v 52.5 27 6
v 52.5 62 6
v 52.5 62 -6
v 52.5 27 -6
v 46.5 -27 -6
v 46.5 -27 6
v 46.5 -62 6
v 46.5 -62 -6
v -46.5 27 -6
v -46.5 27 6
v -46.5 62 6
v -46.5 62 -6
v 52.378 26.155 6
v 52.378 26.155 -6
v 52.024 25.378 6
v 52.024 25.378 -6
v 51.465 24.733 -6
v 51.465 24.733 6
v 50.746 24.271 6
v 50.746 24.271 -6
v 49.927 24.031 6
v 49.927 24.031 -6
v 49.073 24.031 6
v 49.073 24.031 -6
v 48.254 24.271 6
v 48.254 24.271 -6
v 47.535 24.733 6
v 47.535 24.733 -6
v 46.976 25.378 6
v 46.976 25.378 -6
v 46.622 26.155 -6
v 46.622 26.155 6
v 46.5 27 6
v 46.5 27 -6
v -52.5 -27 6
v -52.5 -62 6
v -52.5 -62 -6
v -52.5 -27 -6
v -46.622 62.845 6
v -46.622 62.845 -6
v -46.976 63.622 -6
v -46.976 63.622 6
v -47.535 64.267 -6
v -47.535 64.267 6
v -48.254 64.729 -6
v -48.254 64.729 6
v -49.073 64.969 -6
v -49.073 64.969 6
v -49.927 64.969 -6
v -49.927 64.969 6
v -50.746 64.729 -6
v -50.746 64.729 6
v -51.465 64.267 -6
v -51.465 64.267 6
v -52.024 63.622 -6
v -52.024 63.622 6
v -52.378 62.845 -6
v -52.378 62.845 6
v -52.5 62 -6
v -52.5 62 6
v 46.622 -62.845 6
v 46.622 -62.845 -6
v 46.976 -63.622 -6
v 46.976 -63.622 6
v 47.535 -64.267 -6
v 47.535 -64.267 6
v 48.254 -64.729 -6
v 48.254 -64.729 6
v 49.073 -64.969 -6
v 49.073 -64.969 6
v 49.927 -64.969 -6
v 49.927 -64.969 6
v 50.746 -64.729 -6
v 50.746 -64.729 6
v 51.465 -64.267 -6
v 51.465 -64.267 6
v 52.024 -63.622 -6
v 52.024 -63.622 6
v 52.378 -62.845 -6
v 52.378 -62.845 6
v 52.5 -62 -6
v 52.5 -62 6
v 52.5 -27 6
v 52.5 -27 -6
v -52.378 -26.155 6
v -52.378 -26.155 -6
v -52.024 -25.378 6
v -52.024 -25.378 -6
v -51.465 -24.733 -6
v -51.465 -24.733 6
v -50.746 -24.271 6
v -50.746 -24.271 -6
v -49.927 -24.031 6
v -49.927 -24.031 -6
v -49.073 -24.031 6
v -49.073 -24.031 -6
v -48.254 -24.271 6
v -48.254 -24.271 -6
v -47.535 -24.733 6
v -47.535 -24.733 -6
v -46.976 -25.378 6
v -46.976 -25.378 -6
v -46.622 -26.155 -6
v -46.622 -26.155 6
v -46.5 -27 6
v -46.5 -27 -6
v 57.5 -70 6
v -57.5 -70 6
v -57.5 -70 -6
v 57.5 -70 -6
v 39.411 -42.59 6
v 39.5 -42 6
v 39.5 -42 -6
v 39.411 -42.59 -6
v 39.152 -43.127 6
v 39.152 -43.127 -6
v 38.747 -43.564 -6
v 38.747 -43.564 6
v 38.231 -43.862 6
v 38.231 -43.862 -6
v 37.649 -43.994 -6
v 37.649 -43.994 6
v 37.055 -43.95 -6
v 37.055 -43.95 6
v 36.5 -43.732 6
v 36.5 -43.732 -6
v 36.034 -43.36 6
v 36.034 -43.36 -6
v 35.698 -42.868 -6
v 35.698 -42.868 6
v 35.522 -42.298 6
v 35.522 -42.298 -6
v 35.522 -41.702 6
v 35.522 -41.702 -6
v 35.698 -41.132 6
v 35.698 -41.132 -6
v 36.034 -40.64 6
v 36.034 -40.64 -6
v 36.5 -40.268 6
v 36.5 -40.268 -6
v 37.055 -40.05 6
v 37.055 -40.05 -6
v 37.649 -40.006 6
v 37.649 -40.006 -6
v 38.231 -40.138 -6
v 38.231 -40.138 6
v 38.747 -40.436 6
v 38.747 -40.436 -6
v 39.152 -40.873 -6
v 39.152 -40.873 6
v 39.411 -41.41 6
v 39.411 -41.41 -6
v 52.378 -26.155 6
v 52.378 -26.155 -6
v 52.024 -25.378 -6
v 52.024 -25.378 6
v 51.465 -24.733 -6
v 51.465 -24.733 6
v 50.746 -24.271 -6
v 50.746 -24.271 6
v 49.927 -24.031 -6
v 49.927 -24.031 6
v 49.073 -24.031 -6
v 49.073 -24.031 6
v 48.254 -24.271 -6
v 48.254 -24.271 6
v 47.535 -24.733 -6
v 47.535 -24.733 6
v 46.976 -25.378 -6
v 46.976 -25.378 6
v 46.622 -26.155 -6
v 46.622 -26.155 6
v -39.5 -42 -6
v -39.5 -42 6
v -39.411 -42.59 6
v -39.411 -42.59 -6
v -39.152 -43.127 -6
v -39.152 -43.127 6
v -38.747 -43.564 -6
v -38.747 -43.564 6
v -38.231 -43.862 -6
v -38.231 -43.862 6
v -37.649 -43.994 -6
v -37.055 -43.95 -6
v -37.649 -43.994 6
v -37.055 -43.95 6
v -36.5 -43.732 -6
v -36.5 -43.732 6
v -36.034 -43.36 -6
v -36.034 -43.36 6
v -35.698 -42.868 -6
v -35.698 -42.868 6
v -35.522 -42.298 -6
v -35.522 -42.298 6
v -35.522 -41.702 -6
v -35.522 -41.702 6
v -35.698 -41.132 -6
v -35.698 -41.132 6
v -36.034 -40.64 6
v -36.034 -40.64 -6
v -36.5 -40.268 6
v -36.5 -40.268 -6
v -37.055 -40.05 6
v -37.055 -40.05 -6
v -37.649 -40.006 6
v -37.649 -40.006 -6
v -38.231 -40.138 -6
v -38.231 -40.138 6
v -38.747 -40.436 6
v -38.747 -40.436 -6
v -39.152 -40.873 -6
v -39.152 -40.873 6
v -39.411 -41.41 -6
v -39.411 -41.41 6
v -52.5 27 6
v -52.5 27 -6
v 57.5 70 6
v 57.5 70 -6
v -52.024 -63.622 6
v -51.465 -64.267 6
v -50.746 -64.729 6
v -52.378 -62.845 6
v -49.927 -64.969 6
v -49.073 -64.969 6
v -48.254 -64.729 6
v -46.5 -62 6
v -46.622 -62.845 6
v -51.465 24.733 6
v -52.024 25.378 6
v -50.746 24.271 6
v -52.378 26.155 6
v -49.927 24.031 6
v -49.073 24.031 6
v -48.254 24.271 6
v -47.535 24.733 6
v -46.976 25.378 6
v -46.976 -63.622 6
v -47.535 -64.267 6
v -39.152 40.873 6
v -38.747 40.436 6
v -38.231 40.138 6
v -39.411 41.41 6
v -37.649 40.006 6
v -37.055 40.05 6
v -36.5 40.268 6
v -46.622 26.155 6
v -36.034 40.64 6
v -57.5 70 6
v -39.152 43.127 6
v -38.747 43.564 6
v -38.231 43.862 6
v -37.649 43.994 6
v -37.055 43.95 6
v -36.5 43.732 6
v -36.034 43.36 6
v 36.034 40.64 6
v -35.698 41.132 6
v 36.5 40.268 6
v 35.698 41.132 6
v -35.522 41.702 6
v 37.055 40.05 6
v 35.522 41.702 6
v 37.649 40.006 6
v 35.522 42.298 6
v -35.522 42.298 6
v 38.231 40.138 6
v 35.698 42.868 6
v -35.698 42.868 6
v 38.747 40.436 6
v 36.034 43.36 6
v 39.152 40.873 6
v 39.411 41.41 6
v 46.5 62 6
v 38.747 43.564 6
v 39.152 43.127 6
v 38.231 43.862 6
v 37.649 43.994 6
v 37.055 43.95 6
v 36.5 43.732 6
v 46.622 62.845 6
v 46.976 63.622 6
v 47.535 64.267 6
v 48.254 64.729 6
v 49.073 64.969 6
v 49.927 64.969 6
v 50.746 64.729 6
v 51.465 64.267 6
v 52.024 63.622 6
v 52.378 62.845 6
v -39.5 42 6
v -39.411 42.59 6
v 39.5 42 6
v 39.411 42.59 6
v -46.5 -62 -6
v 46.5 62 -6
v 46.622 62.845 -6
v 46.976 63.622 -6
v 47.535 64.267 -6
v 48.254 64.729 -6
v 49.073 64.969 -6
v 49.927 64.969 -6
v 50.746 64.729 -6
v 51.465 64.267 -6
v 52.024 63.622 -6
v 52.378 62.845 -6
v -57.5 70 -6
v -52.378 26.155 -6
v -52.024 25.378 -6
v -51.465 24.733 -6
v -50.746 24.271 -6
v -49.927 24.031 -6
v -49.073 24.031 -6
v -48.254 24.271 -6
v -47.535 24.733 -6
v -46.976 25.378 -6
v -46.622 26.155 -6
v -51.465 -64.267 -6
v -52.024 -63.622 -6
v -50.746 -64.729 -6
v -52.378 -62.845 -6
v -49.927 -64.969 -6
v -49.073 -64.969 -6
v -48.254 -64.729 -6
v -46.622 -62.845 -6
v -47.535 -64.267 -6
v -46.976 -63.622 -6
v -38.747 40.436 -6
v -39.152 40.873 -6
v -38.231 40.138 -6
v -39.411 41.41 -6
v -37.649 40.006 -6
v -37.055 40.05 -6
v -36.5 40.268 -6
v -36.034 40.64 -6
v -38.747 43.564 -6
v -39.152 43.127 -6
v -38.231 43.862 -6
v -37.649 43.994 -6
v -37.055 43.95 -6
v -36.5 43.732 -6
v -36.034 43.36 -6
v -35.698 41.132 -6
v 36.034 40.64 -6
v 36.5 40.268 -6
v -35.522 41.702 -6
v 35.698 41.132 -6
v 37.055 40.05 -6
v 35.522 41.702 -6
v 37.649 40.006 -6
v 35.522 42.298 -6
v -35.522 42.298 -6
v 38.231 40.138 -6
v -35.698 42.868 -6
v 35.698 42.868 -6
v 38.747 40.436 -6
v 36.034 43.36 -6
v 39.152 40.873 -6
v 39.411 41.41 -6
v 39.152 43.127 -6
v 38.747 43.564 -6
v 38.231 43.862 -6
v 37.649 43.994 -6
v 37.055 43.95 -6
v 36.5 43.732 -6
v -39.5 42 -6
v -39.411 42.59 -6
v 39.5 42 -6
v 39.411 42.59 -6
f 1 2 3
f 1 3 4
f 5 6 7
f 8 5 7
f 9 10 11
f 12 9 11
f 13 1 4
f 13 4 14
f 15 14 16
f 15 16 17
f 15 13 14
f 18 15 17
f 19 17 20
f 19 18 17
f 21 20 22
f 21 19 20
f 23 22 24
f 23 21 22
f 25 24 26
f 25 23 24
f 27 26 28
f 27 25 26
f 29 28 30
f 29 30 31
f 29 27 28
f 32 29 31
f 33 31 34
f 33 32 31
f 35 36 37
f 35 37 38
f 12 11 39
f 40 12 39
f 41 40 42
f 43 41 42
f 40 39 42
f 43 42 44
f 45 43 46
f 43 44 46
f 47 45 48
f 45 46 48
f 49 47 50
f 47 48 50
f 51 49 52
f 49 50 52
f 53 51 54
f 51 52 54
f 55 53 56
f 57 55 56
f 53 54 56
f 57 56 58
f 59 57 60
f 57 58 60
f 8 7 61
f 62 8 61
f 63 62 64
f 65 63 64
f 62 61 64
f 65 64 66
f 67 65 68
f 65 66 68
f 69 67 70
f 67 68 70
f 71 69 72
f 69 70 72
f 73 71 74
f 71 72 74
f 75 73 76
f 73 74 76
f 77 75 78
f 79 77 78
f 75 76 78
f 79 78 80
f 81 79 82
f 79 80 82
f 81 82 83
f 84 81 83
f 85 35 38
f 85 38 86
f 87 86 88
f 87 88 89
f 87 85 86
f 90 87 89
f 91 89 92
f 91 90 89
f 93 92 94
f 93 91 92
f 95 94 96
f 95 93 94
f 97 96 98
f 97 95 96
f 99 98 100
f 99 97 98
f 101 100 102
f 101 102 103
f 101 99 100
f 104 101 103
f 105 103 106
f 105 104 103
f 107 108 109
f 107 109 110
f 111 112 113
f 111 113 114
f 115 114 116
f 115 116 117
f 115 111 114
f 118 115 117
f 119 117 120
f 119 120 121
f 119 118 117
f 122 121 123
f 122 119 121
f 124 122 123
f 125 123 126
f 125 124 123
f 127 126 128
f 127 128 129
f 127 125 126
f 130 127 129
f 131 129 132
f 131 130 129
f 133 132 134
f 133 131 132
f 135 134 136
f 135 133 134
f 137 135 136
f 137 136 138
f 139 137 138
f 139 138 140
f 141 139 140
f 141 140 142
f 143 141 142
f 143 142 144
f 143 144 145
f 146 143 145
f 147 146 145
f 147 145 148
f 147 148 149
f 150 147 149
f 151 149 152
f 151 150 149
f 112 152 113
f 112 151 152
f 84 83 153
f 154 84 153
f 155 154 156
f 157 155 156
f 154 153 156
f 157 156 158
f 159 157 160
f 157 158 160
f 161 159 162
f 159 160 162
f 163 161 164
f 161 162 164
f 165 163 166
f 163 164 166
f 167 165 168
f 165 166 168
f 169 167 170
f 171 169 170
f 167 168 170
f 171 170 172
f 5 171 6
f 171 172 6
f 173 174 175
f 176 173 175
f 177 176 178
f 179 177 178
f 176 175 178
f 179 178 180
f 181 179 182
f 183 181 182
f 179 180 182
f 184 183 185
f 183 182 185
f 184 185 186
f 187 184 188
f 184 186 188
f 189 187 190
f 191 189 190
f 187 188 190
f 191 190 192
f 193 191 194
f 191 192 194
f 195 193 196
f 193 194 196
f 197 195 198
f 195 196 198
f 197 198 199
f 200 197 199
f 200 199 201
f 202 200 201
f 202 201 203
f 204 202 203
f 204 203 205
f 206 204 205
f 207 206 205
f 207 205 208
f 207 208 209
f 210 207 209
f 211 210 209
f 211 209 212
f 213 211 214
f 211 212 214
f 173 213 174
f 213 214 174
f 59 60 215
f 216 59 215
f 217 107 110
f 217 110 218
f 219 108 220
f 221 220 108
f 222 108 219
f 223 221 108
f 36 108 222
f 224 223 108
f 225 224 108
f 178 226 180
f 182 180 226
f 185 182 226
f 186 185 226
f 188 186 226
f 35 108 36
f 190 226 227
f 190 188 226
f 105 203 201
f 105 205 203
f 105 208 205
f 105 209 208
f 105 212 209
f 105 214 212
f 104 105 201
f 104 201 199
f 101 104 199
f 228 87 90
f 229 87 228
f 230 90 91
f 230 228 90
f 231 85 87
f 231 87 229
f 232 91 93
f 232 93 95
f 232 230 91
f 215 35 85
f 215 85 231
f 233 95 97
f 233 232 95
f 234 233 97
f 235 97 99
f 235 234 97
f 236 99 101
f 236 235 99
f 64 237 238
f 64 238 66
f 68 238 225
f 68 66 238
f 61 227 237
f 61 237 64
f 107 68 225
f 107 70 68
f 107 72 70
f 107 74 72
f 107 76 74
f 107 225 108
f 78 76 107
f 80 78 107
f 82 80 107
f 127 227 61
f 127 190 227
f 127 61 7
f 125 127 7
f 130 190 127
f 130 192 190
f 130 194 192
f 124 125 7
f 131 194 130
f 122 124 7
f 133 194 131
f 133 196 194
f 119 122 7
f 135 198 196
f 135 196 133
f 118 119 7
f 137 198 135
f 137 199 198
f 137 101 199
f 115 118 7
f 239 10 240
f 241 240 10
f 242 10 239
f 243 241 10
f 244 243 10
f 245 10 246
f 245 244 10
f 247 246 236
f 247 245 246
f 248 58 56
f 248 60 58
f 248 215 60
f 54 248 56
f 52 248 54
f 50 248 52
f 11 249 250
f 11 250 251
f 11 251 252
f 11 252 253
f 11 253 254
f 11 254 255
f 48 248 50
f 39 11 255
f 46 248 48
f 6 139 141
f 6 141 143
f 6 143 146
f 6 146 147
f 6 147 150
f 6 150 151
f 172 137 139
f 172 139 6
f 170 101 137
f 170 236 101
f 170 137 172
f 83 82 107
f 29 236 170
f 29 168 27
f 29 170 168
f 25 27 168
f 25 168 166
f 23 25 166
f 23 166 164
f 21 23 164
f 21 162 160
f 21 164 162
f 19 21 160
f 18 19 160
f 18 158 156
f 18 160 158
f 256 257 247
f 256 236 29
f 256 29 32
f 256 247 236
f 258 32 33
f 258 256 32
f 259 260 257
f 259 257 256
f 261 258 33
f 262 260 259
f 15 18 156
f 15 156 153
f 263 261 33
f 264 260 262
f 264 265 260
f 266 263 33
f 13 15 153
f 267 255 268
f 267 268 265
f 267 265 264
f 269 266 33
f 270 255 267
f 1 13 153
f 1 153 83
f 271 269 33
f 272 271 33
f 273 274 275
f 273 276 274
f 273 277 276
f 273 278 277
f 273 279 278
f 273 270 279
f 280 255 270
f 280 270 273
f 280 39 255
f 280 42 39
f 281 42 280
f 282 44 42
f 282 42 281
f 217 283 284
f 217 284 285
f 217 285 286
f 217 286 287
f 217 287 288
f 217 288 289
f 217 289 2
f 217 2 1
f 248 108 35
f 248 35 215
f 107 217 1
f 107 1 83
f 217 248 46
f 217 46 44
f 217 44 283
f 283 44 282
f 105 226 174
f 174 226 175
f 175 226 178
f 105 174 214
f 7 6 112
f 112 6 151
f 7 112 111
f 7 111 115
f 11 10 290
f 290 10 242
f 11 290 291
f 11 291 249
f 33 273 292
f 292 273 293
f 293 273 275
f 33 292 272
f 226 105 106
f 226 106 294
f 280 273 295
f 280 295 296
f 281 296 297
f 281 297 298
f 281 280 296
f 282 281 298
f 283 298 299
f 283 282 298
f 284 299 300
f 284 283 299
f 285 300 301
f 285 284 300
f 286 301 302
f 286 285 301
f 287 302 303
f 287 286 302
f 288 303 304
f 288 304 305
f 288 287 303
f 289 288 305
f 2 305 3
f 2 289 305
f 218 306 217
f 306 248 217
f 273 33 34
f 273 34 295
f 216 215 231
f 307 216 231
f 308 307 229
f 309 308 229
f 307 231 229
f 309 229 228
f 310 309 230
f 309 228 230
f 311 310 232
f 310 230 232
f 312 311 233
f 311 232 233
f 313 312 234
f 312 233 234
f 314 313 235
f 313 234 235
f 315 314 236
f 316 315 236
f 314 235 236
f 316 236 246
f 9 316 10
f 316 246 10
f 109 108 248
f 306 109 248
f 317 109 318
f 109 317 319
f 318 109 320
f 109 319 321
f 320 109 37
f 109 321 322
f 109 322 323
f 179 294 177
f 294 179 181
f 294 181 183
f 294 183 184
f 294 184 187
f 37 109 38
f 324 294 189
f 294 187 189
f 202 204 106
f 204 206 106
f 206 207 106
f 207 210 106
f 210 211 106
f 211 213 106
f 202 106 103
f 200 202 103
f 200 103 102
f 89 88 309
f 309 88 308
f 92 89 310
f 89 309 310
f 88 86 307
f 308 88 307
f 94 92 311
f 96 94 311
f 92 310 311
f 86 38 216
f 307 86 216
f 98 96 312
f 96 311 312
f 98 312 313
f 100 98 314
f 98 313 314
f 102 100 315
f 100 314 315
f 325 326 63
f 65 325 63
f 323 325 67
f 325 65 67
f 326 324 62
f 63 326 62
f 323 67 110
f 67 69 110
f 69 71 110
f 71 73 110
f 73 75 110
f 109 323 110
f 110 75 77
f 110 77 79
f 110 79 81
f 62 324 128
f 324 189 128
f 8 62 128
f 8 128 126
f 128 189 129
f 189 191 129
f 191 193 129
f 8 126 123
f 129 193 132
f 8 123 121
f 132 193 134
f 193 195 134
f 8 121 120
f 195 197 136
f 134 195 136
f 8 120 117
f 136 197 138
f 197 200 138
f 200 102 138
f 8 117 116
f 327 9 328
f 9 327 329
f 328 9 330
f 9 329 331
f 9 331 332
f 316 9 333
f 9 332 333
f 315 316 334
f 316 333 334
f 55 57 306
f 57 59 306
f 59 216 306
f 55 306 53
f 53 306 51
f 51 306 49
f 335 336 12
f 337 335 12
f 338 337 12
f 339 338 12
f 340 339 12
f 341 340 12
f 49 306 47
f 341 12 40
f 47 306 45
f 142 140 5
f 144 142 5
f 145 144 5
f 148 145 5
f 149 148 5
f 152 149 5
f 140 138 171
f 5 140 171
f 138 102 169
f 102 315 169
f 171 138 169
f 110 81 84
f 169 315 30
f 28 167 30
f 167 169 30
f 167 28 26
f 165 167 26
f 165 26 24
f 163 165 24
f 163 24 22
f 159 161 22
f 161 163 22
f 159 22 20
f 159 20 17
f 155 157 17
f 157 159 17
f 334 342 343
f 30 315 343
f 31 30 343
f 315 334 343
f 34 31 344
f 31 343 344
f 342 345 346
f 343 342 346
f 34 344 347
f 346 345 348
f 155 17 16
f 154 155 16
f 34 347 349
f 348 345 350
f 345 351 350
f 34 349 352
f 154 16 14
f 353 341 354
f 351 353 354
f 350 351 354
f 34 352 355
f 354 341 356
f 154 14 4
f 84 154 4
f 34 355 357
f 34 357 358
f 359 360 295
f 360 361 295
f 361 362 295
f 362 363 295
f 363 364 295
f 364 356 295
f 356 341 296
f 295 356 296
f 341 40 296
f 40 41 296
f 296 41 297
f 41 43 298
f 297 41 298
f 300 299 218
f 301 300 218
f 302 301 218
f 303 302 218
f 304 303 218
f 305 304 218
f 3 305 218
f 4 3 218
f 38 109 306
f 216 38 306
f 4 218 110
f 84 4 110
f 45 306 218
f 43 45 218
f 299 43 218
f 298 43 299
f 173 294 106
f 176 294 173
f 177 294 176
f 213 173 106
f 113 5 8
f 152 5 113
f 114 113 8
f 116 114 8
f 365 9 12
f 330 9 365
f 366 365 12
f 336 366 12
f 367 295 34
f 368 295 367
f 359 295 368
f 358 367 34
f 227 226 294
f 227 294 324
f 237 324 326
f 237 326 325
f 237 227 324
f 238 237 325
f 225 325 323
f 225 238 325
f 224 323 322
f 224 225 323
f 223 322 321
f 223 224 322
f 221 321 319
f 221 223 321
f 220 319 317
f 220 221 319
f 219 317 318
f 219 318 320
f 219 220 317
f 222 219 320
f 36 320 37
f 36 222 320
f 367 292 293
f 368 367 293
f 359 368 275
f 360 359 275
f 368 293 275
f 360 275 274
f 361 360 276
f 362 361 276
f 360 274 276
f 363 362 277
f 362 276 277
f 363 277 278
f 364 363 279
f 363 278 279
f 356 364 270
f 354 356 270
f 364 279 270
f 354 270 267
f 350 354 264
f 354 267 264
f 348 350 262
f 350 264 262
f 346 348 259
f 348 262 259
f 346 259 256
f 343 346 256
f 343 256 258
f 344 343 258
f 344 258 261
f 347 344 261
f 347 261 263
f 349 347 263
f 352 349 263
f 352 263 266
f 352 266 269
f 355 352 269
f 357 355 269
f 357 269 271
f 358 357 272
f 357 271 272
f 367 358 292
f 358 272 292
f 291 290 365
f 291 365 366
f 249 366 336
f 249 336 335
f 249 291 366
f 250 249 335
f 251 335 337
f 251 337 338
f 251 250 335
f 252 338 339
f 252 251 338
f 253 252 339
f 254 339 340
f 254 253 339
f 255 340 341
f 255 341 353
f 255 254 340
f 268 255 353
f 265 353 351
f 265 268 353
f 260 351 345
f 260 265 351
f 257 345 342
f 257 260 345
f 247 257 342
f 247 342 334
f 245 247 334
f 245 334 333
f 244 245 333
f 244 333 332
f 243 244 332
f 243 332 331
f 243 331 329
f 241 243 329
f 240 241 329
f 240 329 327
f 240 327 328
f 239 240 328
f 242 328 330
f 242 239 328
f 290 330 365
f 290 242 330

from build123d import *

# Parameters (mm, degrees)
SKETCH1_W               = 115
SKETCH1_H               = 140
BOSS_EXTRUDE1_DEPTH     = 6
CUT_EXTRUDE1_DEPTH      = 12
SKETCH5_R               = 2
CUT_EXTRUDE2_DEPTH      = 12
MIRROR2_COPY_1_DEPTH    = 12
MIRROR2_COPY_2_SKETCH_R = 2
MIRROR2_COPY_2_DEPTH    = 12


with BuildPart() as part:
    # Sketch1 → Boss-Extrude1 (new, symmetric)
    with BuildSketch(Plane.XY):
        Rectangle(SKETCH1_W, SKETCH1_H)
    extrude(amount=BOSS_EXTRUDE1_DEPTH, both=True)

    # Sketch4 → Cut-Extrude1 (cut)
    with BuildSketch(Plane.XY.offset(6)):
        with BuildLine():
            Line((52.5, 62), (52.5, 27))
            ThreePointArc((52.5, 27), (49.5, 24), (46.5, 27))
            Line((46.5, 27), (46.5, 62))
            ThreePointArc((46.5, 62), (49.5, 65), (52.5, 62))
        make_face()
    cut_extrude1 = extrude(amount=-CUT_EXTRUDE1_DEPTH, mode=Mode.SUBTRACT)

    # Sketch5 → Cut-Extrude2 (cut)
    with BuildSketch(Plane.XY.offset(6)):
        with Locations((37.5, 42)):
            Circle(SKETCH5_R)
    cut_extrude2 = extrude(amount=-CUT_EXTRUDE2_DEPTH, mode=Mode.SUBTRACT)

    # Mirror1: Cut-Extrude1, Cut-Extrude2 across plane
    add(cut_extrude1.mirror(Plane.ZX), mode=Mode.SUBTRACT)
    add(cut_extrude2.mirror(Plane.ZX), mode=Mode.SUBTRACT)

    # Mirror2: Cut-Extrude1, Cut-Extrude2 across plane
    add(cut_extrude1.mirror(Plane(origin=(0, 0, 0), x_dir=(0, 0, 1), z_dir=(1, 0, 0))), mode=Mode.SUBTRACT)
    add(cut_extrude2.mirror(Plane(origin=(0, 0, 0), x_dir=(0, 0, 1), z_dir=(1, 0, 0))), mode=Mode.SUBTRACT)

    # Mirror2 copy 1 sketch → Mirror2 copy 1 (cut)
    with BuildSketch(Plane(origin=(0, 0, 6), x_dir=(-1, 0, 0), z_dir=(0, 0, 1))):
        with BuildLine():
            Line((52.5, 62), (52.5, 27))
            ThreePointArc((52.5, 27), (49.5, 24), (46.5, 27))
            Line((46.5, 27), (46.5, 62))
            ThreePointArc((46.5, 62), (49.5, 65), (52.5, 62))
        make_face()
    extrude(amount=-MIRROR2_COPY_1_DEPTH, mode=Mode.SUBTRACT)

    # Mirror2 copy 2 sketch → Mirror2 copy 2 (cut)
    with BuildSketch(Plane(origin=(0, 0, 6), x_dir=(-1, 0, 0), z_dir=(0, 0, 1))):
        with Locations((37.5, 42)):
            Circle(MIRROR2_COPY_2_SKETCH_R)
    extrude(amount=-MIRROR2_COPY_2_DEPTH, mode=Mode.SUBTRACT)


solid = part.part
